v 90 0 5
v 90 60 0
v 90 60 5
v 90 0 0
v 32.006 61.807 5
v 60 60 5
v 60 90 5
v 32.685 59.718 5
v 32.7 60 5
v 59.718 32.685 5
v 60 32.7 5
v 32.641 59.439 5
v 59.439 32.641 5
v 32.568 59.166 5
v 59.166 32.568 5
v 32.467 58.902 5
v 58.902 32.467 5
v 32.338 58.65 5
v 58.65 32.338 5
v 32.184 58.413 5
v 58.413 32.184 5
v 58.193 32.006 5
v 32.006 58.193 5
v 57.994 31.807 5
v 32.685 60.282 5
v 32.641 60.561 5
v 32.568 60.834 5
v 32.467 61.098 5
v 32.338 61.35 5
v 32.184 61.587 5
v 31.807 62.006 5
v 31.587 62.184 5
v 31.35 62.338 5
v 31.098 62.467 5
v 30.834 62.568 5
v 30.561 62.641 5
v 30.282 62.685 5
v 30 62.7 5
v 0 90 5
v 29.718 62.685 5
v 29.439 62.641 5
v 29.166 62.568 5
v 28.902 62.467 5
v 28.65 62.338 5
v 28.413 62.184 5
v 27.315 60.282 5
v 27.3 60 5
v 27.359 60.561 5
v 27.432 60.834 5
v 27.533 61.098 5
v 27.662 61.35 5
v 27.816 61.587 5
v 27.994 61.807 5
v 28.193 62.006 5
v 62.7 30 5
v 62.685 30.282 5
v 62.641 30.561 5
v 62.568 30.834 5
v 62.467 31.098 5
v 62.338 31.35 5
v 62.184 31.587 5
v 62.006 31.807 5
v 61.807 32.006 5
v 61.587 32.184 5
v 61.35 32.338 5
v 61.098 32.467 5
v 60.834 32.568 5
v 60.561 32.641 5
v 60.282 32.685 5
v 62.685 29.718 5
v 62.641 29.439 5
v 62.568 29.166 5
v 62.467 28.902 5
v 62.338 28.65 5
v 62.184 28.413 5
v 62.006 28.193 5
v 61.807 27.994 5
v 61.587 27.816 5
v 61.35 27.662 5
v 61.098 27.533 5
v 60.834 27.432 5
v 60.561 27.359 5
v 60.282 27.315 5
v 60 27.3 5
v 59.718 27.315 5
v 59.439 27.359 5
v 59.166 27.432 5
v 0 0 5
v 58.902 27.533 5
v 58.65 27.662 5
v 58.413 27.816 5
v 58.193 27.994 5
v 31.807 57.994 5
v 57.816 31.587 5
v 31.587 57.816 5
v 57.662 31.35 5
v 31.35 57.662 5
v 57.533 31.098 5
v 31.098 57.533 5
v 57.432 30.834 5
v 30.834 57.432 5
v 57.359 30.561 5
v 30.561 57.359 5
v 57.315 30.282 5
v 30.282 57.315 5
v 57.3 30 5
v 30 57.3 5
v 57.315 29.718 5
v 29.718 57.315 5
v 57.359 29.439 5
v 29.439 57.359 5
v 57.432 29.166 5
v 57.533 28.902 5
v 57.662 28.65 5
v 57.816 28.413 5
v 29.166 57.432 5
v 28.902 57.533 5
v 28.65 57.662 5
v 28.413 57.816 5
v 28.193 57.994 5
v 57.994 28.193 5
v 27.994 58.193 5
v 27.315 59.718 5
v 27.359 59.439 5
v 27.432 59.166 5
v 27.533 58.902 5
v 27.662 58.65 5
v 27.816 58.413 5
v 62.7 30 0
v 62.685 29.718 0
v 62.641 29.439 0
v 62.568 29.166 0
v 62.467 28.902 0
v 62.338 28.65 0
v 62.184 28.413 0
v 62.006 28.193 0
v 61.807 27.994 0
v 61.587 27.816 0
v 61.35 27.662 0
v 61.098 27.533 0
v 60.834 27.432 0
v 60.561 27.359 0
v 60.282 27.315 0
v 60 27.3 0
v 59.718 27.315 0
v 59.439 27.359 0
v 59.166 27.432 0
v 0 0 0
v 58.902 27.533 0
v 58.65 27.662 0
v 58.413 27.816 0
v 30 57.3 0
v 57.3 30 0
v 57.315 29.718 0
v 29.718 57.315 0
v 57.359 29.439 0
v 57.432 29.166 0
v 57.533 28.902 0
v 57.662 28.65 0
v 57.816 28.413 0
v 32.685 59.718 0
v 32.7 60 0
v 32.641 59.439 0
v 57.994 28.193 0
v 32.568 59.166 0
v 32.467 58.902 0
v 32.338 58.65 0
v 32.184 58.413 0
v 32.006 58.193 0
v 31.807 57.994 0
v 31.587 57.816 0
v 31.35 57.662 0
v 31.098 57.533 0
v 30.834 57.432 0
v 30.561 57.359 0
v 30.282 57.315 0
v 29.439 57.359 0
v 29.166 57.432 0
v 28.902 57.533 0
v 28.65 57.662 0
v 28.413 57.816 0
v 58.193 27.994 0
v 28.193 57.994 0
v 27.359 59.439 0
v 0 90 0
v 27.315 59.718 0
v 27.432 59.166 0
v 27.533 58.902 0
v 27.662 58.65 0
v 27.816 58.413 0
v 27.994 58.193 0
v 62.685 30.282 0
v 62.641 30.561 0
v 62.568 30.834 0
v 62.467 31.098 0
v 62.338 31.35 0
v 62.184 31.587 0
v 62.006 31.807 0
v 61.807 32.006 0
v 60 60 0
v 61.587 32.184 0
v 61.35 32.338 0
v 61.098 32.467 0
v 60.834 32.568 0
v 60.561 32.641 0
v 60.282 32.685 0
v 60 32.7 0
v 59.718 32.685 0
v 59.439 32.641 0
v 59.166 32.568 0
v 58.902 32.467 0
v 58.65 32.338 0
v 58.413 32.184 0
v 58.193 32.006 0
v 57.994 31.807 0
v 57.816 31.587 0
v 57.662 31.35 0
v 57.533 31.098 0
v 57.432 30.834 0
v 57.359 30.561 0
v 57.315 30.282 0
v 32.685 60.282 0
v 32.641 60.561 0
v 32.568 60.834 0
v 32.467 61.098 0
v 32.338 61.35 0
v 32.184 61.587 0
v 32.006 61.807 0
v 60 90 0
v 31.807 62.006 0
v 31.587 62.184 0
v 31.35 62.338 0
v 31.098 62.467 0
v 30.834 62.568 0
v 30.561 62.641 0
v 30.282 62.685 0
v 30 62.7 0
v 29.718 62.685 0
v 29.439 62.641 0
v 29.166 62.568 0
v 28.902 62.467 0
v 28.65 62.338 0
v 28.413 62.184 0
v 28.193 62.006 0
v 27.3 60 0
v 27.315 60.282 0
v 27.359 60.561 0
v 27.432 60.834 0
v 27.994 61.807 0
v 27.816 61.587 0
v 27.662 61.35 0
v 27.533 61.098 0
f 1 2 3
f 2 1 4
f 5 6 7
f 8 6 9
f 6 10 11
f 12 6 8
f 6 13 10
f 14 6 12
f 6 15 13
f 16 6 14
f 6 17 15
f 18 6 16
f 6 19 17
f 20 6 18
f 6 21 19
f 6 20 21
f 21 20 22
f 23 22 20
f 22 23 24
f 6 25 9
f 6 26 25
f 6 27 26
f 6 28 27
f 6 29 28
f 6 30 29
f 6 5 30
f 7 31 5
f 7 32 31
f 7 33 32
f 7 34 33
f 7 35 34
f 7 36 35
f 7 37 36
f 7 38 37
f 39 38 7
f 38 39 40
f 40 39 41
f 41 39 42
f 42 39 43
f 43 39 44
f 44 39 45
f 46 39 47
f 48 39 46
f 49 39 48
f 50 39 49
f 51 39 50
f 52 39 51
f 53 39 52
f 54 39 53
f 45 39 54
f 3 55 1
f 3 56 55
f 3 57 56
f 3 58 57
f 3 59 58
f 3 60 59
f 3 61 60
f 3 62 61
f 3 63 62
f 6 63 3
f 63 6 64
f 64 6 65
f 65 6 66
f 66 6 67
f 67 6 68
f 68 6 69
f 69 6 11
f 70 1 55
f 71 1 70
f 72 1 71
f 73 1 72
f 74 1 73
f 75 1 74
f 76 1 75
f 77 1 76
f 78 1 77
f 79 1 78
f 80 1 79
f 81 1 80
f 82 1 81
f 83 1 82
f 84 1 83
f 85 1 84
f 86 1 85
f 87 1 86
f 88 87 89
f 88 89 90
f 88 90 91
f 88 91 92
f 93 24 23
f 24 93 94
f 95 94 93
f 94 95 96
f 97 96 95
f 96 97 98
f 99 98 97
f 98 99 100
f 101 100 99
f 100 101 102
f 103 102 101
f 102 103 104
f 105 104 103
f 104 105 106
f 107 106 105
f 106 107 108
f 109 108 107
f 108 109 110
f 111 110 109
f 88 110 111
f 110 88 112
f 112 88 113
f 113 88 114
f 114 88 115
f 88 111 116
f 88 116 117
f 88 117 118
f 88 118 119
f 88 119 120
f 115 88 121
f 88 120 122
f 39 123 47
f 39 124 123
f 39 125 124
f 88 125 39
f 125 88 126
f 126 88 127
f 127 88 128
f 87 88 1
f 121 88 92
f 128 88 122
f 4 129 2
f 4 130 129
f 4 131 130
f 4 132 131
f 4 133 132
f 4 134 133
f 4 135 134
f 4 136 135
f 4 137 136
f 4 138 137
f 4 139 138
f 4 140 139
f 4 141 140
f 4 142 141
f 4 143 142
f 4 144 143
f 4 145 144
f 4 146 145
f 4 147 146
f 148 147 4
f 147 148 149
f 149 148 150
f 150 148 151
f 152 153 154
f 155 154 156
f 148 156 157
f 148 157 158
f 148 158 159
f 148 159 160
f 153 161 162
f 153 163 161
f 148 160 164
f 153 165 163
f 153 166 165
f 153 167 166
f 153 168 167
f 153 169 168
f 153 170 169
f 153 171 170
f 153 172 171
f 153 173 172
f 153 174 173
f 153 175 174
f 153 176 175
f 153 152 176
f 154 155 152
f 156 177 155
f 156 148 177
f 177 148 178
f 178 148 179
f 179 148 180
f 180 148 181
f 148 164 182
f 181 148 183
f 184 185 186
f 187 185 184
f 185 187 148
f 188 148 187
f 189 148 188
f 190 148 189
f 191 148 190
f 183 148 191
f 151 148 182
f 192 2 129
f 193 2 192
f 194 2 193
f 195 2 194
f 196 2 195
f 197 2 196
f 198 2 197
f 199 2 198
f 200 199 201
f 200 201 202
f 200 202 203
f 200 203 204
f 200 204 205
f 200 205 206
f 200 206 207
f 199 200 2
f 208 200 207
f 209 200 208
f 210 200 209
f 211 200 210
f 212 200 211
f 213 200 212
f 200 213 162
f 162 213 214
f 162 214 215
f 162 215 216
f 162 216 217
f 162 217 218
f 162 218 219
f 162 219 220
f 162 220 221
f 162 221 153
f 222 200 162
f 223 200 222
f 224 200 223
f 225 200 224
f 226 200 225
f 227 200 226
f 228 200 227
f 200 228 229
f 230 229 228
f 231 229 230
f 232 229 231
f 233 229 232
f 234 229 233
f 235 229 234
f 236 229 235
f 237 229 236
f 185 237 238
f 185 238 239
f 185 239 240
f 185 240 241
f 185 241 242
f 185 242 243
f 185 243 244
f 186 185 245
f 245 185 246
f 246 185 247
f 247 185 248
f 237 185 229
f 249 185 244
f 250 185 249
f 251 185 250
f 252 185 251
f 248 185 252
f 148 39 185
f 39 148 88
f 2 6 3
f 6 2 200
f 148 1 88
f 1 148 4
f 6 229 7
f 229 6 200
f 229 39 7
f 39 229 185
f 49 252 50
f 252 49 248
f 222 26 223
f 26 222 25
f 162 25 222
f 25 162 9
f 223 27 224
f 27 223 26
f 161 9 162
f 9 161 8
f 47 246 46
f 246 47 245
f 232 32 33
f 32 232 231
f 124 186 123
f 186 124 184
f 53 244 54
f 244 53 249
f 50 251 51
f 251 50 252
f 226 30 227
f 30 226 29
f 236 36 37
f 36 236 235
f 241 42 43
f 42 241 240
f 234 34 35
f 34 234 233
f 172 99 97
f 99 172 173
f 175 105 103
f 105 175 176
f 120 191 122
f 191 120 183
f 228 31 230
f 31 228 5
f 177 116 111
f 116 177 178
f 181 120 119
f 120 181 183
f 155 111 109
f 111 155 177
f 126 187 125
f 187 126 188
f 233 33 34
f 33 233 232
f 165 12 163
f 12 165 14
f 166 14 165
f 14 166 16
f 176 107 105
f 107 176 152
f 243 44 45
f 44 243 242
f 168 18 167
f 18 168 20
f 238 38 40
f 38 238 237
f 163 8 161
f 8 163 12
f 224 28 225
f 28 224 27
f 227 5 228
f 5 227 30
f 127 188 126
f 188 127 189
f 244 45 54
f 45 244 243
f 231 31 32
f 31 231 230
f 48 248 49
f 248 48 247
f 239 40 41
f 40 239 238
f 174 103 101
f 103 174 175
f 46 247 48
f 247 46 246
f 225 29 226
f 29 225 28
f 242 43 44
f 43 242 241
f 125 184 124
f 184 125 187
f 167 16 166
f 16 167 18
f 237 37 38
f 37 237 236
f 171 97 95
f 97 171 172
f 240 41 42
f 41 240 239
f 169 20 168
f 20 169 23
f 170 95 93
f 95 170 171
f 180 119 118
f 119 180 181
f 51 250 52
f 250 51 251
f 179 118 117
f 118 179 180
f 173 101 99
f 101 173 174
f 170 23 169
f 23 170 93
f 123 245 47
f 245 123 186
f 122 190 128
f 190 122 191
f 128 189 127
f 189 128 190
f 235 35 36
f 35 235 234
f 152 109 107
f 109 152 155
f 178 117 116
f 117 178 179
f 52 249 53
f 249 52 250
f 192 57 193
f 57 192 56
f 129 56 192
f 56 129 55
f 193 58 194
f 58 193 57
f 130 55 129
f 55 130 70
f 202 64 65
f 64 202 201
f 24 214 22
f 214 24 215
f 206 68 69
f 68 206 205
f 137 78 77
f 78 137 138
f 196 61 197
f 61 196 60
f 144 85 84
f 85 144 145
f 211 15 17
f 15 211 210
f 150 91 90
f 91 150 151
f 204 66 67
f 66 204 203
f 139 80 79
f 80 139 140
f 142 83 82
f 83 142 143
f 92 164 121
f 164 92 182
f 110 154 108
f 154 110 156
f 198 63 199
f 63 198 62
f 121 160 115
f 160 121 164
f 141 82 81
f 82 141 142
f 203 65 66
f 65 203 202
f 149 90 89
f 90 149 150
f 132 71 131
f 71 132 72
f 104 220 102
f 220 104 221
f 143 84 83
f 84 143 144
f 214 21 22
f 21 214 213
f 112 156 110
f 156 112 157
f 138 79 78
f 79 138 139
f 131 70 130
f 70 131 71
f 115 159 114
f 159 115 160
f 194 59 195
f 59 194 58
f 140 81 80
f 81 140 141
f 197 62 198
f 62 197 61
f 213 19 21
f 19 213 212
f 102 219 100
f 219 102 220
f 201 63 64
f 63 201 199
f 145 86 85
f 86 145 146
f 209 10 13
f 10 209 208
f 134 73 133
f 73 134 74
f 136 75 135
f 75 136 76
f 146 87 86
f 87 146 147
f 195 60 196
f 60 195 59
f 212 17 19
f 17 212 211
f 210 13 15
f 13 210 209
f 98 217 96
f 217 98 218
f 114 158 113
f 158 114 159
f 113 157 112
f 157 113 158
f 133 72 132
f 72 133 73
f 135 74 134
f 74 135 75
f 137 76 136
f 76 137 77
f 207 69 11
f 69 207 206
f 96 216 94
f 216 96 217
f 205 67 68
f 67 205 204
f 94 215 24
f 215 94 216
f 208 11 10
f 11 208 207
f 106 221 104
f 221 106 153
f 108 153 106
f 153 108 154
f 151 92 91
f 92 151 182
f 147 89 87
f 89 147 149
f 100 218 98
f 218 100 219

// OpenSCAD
// V-slot corner connector.
$fn = 60;
eps = 0.02;
profile = 60;
arm = 90;
plate_t = 5;
difference() {
    union() { cube([arm,profile,plate_t]); cube([profile,arm,plate_t]); }
    for (p=[[profile/2,arm-profile/2],[arm-profile/2,profile/2]]) translate([p[0],p[1],-eps]) cylinder(d=5.4,h=plate_t+2*eps);
}
